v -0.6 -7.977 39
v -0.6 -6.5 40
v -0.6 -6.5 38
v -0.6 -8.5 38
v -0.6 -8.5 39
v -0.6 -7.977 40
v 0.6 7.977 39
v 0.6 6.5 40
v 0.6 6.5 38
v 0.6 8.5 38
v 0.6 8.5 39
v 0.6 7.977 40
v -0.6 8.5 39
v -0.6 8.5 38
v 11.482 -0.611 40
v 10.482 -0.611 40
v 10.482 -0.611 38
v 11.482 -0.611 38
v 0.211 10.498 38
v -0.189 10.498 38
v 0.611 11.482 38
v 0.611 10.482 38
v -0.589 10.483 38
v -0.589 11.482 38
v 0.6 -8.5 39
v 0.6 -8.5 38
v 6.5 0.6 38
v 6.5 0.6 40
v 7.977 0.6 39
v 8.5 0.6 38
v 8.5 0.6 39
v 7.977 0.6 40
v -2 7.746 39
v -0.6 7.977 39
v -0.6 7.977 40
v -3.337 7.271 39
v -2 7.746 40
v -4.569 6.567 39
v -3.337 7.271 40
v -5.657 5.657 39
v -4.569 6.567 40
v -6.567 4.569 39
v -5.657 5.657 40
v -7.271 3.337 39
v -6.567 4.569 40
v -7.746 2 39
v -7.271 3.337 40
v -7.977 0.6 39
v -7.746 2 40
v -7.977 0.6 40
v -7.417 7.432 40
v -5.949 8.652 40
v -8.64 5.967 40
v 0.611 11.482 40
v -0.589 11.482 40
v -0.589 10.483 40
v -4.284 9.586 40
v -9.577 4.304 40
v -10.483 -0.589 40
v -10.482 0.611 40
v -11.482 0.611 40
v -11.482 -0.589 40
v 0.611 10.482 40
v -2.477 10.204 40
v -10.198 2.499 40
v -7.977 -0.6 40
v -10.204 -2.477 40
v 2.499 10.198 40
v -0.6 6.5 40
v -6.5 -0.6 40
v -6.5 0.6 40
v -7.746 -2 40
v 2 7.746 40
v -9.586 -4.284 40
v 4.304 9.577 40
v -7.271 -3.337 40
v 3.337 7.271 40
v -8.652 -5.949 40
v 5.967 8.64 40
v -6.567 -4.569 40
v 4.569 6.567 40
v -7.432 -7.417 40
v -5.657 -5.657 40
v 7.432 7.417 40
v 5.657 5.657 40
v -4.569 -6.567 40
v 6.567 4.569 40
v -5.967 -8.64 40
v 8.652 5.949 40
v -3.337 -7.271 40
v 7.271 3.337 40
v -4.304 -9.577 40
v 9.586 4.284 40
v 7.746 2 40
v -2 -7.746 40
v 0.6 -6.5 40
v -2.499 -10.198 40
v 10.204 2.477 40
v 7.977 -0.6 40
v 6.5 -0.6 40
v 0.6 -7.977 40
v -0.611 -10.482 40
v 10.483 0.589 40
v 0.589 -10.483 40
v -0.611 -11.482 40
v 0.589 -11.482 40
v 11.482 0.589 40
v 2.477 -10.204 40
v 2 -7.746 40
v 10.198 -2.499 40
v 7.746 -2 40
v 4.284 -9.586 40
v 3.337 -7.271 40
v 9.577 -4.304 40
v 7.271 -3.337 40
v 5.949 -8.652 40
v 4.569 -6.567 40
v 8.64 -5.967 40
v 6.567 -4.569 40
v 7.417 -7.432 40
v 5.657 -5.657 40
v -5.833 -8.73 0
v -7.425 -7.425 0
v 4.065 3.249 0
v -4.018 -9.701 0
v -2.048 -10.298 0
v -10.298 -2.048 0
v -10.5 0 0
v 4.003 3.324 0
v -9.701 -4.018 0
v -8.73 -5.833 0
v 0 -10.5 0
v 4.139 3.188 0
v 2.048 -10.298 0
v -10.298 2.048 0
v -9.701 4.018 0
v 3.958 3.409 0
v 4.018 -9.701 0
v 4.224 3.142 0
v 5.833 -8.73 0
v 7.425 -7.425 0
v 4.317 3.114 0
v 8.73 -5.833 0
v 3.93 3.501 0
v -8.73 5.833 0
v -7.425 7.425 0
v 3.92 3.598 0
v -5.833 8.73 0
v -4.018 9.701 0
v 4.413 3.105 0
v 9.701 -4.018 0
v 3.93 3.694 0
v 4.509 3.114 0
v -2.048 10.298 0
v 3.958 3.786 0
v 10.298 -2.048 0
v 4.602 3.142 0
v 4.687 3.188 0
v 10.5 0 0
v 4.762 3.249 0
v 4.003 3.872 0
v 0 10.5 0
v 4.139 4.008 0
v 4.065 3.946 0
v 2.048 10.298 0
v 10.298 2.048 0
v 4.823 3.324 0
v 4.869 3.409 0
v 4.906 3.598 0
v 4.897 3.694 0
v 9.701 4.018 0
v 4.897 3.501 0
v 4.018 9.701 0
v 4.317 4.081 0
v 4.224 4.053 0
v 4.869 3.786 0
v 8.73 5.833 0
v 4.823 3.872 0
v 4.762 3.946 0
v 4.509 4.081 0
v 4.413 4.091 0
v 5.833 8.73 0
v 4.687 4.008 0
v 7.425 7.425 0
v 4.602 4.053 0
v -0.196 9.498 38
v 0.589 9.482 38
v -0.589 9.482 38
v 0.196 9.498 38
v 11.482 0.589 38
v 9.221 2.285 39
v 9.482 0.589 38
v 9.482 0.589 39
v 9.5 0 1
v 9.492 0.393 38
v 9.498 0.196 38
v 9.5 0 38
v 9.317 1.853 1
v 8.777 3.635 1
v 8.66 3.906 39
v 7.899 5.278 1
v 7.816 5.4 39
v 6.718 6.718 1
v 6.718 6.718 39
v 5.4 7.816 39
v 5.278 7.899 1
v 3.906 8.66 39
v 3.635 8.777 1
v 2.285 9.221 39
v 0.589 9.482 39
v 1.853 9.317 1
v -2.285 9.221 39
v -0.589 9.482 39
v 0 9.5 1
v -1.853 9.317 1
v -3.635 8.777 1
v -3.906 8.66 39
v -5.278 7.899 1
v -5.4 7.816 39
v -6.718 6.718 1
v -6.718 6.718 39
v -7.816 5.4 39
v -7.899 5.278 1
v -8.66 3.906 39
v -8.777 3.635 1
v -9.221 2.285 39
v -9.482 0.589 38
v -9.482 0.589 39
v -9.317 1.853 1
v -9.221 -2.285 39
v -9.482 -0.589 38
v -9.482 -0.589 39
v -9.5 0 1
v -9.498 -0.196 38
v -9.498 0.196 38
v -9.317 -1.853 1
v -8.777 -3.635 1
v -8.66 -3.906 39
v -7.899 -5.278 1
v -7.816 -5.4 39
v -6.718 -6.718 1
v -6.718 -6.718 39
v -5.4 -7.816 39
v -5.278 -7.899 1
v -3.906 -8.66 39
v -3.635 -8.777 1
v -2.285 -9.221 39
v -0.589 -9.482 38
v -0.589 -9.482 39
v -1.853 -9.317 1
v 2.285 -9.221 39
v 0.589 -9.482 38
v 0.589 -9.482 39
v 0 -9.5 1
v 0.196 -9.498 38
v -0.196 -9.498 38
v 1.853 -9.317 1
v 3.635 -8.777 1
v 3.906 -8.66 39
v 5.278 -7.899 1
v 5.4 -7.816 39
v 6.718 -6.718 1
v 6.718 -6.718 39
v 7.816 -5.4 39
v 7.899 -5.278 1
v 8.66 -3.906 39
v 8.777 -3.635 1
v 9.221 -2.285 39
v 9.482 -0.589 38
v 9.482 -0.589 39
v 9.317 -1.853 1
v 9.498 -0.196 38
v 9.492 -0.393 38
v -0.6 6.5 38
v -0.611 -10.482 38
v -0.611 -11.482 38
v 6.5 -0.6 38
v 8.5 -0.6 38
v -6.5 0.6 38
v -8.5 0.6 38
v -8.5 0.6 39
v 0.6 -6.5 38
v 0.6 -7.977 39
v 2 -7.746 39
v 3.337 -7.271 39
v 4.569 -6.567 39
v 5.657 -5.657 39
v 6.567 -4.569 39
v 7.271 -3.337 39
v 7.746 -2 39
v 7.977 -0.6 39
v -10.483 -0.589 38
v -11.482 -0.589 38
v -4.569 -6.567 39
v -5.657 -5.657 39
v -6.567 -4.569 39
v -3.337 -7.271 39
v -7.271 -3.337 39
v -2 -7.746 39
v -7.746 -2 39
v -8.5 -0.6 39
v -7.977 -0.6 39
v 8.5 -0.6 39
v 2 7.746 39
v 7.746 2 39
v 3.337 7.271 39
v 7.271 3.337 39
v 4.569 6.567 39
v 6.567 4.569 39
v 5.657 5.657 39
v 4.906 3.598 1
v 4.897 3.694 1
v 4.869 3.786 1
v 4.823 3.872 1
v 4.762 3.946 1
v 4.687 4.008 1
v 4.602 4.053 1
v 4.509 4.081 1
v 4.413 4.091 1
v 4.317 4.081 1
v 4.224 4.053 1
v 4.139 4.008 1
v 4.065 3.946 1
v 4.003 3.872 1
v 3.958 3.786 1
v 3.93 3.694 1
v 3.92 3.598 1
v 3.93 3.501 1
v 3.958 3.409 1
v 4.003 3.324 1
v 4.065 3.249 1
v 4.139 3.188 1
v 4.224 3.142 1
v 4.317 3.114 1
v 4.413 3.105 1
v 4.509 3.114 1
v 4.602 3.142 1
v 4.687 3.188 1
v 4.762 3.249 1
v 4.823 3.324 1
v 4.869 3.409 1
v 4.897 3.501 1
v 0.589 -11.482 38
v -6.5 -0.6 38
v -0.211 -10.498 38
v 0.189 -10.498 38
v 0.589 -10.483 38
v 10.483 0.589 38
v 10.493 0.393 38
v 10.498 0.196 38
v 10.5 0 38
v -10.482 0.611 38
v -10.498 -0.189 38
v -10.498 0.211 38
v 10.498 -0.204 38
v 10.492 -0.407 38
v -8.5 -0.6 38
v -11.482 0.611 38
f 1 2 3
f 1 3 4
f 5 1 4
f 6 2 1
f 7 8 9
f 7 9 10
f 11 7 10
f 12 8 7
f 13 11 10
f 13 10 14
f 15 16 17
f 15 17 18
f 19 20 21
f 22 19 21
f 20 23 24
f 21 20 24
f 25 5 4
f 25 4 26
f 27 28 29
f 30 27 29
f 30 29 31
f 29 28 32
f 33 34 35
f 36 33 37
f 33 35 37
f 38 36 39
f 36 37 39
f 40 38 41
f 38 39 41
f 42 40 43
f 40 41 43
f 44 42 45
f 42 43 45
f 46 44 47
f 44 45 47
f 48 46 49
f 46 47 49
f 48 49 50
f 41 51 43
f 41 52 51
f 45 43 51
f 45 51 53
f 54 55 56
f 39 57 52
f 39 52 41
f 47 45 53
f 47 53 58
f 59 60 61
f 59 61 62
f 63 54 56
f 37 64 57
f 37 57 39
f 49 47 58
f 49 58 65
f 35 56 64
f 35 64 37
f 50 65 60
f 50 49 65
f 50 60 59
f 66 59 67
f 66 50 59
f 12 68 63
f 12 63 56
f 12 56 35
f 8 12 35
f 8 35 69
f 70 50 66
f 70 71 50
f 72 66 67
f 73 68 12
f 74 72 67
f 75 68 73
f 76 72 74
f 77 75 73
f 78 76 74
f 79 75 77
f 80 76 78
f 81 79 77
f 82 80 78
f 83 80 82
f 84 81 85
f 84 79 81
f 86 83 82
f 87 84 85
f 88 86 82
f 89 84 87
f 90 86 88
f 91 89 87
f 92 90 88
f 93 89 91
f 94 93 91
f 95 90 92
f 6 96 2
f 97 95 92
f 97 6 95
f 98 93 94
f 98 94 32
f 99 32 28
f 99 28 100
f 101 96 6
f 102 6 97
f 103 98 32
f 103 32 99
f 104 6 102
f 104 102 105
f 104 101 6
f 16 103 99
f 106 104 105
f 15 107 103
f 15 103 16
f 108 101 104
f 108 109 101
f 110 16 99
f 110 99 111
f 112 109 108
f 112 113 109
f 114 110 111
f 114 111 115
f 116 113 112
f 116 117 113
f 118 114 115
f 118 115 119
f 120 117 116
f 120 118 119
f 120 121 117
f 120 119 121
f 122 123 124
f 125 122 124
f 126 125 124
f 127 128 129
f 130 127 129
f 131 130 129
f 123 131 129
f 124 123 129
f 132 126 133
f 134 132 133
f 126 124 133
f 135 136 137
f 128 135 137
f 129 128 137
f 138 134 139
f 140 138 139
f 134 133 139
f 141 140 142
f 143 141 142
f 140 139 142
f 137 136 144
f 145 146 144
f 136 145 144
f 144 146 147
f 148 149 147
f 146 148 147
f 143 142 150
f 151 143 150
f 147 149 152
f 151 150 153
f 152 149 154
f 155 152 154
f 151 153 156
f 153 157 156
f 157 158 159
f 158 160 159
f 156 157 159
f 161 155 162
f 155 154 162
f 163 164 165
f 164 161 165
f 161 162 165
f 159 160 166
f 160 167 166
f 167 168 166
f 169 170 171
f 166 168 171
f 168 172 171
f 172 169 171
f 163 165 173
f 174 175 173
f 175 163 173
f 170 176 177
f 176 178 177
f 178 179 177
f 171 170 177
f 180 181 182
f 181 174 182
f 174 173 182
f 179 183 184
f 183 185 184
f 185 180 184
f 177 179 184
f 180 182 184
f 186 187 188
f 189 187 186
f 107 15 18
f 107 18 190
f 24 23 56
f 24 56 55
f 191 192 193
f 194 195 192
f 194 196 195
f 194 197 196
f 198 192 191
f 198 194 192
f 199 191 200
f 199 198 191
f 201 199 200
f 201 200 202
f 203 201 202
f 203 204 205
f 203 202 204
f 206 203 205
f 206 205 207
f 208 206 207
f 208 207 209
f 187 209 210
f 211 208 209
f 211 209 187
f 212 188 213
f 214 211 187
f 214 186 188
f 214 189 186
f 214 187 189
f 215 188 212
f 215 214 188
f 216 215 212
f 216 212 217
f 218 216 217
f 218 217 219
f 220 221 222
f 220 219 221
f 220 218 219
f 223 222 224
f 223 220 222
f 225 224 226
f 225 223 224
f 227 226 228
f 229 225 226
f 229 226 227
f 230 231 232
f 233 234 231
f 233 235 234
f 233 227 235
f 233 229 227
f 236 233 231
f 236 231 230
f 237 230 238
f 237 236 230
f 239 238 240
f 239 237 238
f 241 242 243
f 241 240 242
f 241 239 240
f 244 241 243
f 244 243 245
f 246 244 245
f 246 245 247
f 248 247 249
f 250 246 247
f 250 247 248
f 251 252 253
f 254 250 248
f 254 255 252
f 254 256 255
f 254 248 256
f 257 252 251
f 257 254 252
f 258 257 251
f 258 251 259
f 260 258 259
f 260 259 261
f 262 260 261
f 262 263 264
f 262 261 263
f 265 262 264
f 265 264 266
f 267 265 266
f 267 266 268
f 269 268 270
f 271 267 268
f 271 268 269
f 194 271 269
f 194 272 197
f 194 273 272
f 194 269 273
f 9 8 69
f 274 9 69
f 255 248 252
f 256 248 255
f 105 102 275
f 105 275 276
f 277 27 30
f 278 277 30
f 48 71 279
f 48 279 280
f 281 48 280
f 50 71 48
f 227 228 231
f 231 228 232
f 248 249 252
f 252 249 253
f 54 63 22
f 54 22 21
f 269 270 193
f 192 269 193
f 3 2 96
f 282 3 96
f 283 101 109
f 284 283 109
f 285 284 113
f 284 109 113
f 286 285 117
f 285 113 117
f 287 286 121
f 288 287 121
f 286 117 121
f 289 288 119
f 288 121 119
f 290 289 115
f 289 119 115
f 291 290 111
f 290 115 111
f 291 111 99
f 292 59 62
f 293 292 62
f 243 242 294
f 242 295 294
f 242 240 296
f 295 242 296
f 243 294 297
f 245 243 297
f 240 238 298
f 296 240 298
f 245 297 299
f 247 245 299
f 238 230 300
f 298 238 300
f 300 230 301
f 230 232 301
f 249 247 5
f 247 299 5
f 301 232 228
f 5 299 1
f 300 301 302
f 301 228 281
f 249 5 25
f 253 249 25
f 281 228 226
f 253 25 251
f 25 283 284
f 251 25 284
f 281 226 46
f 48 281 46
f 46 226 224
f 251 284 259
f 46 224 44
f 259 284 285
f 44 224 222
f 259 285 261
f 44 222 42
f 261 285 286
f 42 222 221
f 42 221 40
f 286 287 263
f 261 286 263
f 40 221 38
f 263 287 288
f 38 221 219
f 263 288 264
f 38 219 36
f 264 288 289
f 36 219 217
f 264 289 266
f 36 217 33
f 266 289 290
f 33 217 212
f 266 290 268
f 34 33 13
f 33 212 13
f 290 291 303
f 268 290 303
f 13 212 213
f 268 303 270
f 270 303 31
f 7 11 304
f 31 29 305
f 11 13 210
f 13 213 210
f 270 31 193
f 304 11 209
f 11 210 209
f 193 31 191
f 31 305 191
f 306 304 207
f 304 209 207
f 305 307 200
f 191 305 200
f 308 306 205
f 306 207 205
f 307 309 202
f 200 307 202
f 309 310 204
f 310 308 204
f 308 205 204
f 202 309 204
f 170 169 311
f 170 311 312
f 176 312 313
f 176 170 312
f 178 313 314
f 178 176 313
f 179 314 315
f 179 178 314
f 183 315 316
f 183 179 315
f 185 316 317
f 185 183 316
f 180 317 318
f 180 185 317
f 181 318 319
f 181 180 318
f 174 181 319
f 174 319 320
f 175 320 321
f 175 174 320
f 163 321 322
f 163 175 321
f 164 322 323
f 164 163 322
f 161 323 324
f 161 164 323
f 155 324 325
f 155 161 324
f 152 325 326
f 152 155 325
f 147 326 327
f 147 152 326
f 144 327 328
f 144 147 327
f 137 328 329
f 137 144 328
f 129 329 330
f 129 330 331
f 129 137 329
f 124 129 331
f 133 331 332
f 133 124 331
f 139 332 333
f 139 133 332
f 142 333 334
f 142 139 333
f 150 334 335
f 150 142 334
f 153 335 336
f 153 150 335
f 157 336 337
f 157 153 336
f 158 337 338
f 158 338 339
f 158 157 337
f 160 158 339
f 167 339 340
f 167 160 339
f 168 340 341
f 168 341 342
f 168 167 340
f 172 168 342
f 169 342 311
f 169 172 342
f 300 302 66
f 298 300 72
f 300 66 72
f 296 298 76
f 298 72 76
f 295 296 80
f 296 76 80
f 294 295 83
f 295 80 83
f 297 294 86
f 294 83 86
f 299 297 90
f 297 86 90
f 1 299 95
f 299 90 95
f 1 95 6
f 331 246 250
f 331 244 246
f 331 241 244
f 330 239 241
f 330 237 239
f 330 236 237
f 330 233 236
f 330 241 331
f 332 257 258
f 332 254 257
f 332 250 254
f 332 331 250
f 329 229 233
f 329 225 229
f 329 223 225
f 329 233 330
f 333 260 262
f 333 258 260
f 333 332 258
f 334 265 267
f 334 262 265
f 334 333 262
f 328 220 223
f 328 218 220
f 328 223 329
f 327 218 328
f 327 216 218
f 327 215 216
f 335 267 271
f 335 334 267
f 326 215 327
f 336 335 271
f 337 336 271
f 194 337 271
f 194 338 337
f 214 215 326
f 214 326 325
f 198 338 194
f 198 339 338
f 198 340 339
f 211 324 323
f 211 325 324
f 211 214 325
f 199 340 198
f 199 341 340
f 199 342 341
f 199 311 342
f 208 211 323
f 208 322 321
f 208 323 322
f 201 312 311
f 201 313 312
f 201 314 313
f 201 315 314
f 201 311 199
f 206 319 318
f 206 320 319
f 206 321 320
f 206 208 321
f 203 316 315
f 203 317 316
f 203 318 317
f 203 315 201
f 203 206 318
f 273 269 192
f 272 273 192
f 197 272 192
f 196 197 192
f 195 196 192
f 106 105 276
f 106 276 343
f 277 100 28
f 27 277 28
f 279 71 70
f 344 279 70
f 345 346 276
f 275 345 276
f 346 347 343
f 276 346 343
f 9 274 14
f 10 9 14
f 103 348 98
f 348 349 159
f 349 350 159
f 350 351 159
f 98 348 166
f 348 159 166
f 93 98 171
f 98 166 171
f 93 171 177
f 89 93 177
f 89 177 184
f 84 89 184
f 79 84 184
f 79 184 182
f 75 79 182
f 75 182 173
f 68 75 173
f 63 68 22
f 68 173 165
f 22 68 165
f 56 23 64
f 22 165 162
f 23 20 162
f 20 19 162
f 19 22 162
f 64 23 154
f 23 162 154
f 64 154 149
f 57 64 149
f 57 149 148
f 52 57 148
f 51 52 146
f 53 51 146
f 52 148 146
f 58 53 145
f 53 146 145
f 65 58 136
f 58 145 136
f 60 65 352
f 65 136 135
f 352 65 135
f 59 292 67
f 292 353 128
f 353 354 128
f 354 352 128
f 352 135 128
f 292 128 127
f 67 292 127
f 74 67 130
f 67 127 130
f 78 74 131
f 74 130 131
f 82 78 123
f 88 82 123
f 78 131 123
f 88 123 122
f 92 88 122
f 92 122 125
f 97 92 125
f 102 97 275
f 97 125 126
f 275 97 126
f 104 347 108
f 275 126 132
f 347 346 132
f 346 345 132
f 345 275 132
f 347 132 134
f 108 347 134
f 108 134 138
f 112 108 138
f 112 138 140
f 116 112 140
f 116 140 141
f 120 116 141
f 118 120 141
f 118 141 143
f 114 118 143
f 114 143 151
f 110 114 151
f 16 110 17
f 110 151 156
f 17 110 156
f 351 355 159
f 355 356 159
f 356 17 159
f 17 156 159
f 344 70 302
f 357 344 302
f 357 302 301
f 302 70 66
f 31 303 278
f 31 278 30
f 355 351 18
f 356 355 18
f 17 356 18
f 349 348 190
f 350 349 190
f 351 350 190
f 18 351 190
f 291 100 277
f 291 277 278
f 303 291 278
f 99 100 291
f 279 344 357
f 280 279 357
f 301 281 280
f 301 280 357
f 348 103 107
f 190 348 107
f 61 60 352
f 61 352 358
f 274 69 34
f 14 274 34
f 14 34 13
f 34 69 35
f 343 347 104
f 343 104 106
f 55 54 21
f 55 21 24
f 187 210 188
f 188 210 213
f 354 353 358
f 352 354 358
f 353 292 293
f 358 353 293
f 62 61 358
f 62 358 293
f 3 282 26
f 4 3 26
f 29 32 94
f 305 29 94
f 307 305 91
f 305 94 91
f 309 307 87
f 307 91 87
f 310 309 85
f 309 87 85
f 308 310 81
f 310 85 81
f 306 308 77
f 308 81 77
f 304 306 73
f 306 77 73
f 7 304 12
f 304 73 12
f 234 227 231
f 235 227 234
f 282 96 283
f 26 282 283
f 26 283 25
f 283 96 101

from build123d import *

# Parameters (mm, degrees)
SKETCH_1_R               = 10.5
SKETCH_1_R_2             = 9.5
EXTRUDE_1_DEPTH          = 40
SKETCH_2_R               = 10.5
EXTRUDE_2_DEPTH          = 1
SKETCH_3_R               = 0.492995
CUT_EXTRUDE_1_DEPTH      = 1
EXTRUDE_START            = 40
SKETCH_6_R               = 10
SKETCH_6_R_2             = 8
EXTRUDE_3_DEPTH          = 1
SKETCH_5_W               = 2
SKETCH_5_H               = 1.2
EXTRUDE_4_DEPTH          = 2
PATTERN_CIRCULAR_1_COUNT = 4


with BuildPart() as part:
    # ｽｹｯﾁ1 → ﾎﾞｽ - 押し出し1 (new body)
    with BuildSketch(Plane.XY):
        Circle(SKETCH_1_R)
        Circle(SKETCH_1_R_2, mode=Mode.SUBTRACT)
    extrude(amount=EXTRUDE_1_DEPTH)

    # ｽｹｯﾁ2 → ﾎﾞｽ - 押し出し2 (add)
    with BuildSketch(Plane.XY):
        Circle(SKETCH_2_R)
    extrude(amount=EXTRUDE_2_DEPTH)

    # ｽｹｯﾁ3 → ｶｯﾄ - 押し出し1 (cut)
    with BuildSketch(Plane.XY):
        with Locations((4.413132646, 3.597662483)):
            Circle(SKETCH_3_R)
    extrude(amount=CUT_EXTRUDE_1_DEPTH, mode=Mode.SUBTRACT)

    # ｽｹｯﾁ6 → ﾎﾞｽ - 押し出し3 (add)
    with BuildSketch(Plane.XY.offset(EXTRUDE_START)):
        Circle(SKETCH_6_R)
        Circle(SKETCH_6_R_2, mode=Mode.SUBTRACT)
    extrude(amount=-EXTRUDE_3_DEPTH)

    # ｽｹｯﾁ5 → ﾎﾞｽ - 押し出し4 (add)
    with BuildSketch(Plane.XY.offset(40)):
        with Locations((7.5, 0)):
            Rectangle(SKETCH_5_W, SKETCH_5_H)
        with Locations((10.48172138, -0.010967172)):
            Rectangle(SKETCH_5_W, SKETCH_5_H)
    extrude_4 = extrude(amount=-EXTRUDE_4_DEPTH)

    # 円形ﾊﾟﾀｰﾝ1: ﾎﾞｽ - 押し出し4 ×4 about axis
    pattern_circular_1_axis = Axis((0, 0, 0), (0, 0, 1))
    for i in range(1, PATTERN_CIRCULAR_1_COUNT):
        add(extrude_4.rotate(pattern_circular_1_axis, i * 360 / PATTERN_CIRCULAR_1_COUNT))


solid = part.part
